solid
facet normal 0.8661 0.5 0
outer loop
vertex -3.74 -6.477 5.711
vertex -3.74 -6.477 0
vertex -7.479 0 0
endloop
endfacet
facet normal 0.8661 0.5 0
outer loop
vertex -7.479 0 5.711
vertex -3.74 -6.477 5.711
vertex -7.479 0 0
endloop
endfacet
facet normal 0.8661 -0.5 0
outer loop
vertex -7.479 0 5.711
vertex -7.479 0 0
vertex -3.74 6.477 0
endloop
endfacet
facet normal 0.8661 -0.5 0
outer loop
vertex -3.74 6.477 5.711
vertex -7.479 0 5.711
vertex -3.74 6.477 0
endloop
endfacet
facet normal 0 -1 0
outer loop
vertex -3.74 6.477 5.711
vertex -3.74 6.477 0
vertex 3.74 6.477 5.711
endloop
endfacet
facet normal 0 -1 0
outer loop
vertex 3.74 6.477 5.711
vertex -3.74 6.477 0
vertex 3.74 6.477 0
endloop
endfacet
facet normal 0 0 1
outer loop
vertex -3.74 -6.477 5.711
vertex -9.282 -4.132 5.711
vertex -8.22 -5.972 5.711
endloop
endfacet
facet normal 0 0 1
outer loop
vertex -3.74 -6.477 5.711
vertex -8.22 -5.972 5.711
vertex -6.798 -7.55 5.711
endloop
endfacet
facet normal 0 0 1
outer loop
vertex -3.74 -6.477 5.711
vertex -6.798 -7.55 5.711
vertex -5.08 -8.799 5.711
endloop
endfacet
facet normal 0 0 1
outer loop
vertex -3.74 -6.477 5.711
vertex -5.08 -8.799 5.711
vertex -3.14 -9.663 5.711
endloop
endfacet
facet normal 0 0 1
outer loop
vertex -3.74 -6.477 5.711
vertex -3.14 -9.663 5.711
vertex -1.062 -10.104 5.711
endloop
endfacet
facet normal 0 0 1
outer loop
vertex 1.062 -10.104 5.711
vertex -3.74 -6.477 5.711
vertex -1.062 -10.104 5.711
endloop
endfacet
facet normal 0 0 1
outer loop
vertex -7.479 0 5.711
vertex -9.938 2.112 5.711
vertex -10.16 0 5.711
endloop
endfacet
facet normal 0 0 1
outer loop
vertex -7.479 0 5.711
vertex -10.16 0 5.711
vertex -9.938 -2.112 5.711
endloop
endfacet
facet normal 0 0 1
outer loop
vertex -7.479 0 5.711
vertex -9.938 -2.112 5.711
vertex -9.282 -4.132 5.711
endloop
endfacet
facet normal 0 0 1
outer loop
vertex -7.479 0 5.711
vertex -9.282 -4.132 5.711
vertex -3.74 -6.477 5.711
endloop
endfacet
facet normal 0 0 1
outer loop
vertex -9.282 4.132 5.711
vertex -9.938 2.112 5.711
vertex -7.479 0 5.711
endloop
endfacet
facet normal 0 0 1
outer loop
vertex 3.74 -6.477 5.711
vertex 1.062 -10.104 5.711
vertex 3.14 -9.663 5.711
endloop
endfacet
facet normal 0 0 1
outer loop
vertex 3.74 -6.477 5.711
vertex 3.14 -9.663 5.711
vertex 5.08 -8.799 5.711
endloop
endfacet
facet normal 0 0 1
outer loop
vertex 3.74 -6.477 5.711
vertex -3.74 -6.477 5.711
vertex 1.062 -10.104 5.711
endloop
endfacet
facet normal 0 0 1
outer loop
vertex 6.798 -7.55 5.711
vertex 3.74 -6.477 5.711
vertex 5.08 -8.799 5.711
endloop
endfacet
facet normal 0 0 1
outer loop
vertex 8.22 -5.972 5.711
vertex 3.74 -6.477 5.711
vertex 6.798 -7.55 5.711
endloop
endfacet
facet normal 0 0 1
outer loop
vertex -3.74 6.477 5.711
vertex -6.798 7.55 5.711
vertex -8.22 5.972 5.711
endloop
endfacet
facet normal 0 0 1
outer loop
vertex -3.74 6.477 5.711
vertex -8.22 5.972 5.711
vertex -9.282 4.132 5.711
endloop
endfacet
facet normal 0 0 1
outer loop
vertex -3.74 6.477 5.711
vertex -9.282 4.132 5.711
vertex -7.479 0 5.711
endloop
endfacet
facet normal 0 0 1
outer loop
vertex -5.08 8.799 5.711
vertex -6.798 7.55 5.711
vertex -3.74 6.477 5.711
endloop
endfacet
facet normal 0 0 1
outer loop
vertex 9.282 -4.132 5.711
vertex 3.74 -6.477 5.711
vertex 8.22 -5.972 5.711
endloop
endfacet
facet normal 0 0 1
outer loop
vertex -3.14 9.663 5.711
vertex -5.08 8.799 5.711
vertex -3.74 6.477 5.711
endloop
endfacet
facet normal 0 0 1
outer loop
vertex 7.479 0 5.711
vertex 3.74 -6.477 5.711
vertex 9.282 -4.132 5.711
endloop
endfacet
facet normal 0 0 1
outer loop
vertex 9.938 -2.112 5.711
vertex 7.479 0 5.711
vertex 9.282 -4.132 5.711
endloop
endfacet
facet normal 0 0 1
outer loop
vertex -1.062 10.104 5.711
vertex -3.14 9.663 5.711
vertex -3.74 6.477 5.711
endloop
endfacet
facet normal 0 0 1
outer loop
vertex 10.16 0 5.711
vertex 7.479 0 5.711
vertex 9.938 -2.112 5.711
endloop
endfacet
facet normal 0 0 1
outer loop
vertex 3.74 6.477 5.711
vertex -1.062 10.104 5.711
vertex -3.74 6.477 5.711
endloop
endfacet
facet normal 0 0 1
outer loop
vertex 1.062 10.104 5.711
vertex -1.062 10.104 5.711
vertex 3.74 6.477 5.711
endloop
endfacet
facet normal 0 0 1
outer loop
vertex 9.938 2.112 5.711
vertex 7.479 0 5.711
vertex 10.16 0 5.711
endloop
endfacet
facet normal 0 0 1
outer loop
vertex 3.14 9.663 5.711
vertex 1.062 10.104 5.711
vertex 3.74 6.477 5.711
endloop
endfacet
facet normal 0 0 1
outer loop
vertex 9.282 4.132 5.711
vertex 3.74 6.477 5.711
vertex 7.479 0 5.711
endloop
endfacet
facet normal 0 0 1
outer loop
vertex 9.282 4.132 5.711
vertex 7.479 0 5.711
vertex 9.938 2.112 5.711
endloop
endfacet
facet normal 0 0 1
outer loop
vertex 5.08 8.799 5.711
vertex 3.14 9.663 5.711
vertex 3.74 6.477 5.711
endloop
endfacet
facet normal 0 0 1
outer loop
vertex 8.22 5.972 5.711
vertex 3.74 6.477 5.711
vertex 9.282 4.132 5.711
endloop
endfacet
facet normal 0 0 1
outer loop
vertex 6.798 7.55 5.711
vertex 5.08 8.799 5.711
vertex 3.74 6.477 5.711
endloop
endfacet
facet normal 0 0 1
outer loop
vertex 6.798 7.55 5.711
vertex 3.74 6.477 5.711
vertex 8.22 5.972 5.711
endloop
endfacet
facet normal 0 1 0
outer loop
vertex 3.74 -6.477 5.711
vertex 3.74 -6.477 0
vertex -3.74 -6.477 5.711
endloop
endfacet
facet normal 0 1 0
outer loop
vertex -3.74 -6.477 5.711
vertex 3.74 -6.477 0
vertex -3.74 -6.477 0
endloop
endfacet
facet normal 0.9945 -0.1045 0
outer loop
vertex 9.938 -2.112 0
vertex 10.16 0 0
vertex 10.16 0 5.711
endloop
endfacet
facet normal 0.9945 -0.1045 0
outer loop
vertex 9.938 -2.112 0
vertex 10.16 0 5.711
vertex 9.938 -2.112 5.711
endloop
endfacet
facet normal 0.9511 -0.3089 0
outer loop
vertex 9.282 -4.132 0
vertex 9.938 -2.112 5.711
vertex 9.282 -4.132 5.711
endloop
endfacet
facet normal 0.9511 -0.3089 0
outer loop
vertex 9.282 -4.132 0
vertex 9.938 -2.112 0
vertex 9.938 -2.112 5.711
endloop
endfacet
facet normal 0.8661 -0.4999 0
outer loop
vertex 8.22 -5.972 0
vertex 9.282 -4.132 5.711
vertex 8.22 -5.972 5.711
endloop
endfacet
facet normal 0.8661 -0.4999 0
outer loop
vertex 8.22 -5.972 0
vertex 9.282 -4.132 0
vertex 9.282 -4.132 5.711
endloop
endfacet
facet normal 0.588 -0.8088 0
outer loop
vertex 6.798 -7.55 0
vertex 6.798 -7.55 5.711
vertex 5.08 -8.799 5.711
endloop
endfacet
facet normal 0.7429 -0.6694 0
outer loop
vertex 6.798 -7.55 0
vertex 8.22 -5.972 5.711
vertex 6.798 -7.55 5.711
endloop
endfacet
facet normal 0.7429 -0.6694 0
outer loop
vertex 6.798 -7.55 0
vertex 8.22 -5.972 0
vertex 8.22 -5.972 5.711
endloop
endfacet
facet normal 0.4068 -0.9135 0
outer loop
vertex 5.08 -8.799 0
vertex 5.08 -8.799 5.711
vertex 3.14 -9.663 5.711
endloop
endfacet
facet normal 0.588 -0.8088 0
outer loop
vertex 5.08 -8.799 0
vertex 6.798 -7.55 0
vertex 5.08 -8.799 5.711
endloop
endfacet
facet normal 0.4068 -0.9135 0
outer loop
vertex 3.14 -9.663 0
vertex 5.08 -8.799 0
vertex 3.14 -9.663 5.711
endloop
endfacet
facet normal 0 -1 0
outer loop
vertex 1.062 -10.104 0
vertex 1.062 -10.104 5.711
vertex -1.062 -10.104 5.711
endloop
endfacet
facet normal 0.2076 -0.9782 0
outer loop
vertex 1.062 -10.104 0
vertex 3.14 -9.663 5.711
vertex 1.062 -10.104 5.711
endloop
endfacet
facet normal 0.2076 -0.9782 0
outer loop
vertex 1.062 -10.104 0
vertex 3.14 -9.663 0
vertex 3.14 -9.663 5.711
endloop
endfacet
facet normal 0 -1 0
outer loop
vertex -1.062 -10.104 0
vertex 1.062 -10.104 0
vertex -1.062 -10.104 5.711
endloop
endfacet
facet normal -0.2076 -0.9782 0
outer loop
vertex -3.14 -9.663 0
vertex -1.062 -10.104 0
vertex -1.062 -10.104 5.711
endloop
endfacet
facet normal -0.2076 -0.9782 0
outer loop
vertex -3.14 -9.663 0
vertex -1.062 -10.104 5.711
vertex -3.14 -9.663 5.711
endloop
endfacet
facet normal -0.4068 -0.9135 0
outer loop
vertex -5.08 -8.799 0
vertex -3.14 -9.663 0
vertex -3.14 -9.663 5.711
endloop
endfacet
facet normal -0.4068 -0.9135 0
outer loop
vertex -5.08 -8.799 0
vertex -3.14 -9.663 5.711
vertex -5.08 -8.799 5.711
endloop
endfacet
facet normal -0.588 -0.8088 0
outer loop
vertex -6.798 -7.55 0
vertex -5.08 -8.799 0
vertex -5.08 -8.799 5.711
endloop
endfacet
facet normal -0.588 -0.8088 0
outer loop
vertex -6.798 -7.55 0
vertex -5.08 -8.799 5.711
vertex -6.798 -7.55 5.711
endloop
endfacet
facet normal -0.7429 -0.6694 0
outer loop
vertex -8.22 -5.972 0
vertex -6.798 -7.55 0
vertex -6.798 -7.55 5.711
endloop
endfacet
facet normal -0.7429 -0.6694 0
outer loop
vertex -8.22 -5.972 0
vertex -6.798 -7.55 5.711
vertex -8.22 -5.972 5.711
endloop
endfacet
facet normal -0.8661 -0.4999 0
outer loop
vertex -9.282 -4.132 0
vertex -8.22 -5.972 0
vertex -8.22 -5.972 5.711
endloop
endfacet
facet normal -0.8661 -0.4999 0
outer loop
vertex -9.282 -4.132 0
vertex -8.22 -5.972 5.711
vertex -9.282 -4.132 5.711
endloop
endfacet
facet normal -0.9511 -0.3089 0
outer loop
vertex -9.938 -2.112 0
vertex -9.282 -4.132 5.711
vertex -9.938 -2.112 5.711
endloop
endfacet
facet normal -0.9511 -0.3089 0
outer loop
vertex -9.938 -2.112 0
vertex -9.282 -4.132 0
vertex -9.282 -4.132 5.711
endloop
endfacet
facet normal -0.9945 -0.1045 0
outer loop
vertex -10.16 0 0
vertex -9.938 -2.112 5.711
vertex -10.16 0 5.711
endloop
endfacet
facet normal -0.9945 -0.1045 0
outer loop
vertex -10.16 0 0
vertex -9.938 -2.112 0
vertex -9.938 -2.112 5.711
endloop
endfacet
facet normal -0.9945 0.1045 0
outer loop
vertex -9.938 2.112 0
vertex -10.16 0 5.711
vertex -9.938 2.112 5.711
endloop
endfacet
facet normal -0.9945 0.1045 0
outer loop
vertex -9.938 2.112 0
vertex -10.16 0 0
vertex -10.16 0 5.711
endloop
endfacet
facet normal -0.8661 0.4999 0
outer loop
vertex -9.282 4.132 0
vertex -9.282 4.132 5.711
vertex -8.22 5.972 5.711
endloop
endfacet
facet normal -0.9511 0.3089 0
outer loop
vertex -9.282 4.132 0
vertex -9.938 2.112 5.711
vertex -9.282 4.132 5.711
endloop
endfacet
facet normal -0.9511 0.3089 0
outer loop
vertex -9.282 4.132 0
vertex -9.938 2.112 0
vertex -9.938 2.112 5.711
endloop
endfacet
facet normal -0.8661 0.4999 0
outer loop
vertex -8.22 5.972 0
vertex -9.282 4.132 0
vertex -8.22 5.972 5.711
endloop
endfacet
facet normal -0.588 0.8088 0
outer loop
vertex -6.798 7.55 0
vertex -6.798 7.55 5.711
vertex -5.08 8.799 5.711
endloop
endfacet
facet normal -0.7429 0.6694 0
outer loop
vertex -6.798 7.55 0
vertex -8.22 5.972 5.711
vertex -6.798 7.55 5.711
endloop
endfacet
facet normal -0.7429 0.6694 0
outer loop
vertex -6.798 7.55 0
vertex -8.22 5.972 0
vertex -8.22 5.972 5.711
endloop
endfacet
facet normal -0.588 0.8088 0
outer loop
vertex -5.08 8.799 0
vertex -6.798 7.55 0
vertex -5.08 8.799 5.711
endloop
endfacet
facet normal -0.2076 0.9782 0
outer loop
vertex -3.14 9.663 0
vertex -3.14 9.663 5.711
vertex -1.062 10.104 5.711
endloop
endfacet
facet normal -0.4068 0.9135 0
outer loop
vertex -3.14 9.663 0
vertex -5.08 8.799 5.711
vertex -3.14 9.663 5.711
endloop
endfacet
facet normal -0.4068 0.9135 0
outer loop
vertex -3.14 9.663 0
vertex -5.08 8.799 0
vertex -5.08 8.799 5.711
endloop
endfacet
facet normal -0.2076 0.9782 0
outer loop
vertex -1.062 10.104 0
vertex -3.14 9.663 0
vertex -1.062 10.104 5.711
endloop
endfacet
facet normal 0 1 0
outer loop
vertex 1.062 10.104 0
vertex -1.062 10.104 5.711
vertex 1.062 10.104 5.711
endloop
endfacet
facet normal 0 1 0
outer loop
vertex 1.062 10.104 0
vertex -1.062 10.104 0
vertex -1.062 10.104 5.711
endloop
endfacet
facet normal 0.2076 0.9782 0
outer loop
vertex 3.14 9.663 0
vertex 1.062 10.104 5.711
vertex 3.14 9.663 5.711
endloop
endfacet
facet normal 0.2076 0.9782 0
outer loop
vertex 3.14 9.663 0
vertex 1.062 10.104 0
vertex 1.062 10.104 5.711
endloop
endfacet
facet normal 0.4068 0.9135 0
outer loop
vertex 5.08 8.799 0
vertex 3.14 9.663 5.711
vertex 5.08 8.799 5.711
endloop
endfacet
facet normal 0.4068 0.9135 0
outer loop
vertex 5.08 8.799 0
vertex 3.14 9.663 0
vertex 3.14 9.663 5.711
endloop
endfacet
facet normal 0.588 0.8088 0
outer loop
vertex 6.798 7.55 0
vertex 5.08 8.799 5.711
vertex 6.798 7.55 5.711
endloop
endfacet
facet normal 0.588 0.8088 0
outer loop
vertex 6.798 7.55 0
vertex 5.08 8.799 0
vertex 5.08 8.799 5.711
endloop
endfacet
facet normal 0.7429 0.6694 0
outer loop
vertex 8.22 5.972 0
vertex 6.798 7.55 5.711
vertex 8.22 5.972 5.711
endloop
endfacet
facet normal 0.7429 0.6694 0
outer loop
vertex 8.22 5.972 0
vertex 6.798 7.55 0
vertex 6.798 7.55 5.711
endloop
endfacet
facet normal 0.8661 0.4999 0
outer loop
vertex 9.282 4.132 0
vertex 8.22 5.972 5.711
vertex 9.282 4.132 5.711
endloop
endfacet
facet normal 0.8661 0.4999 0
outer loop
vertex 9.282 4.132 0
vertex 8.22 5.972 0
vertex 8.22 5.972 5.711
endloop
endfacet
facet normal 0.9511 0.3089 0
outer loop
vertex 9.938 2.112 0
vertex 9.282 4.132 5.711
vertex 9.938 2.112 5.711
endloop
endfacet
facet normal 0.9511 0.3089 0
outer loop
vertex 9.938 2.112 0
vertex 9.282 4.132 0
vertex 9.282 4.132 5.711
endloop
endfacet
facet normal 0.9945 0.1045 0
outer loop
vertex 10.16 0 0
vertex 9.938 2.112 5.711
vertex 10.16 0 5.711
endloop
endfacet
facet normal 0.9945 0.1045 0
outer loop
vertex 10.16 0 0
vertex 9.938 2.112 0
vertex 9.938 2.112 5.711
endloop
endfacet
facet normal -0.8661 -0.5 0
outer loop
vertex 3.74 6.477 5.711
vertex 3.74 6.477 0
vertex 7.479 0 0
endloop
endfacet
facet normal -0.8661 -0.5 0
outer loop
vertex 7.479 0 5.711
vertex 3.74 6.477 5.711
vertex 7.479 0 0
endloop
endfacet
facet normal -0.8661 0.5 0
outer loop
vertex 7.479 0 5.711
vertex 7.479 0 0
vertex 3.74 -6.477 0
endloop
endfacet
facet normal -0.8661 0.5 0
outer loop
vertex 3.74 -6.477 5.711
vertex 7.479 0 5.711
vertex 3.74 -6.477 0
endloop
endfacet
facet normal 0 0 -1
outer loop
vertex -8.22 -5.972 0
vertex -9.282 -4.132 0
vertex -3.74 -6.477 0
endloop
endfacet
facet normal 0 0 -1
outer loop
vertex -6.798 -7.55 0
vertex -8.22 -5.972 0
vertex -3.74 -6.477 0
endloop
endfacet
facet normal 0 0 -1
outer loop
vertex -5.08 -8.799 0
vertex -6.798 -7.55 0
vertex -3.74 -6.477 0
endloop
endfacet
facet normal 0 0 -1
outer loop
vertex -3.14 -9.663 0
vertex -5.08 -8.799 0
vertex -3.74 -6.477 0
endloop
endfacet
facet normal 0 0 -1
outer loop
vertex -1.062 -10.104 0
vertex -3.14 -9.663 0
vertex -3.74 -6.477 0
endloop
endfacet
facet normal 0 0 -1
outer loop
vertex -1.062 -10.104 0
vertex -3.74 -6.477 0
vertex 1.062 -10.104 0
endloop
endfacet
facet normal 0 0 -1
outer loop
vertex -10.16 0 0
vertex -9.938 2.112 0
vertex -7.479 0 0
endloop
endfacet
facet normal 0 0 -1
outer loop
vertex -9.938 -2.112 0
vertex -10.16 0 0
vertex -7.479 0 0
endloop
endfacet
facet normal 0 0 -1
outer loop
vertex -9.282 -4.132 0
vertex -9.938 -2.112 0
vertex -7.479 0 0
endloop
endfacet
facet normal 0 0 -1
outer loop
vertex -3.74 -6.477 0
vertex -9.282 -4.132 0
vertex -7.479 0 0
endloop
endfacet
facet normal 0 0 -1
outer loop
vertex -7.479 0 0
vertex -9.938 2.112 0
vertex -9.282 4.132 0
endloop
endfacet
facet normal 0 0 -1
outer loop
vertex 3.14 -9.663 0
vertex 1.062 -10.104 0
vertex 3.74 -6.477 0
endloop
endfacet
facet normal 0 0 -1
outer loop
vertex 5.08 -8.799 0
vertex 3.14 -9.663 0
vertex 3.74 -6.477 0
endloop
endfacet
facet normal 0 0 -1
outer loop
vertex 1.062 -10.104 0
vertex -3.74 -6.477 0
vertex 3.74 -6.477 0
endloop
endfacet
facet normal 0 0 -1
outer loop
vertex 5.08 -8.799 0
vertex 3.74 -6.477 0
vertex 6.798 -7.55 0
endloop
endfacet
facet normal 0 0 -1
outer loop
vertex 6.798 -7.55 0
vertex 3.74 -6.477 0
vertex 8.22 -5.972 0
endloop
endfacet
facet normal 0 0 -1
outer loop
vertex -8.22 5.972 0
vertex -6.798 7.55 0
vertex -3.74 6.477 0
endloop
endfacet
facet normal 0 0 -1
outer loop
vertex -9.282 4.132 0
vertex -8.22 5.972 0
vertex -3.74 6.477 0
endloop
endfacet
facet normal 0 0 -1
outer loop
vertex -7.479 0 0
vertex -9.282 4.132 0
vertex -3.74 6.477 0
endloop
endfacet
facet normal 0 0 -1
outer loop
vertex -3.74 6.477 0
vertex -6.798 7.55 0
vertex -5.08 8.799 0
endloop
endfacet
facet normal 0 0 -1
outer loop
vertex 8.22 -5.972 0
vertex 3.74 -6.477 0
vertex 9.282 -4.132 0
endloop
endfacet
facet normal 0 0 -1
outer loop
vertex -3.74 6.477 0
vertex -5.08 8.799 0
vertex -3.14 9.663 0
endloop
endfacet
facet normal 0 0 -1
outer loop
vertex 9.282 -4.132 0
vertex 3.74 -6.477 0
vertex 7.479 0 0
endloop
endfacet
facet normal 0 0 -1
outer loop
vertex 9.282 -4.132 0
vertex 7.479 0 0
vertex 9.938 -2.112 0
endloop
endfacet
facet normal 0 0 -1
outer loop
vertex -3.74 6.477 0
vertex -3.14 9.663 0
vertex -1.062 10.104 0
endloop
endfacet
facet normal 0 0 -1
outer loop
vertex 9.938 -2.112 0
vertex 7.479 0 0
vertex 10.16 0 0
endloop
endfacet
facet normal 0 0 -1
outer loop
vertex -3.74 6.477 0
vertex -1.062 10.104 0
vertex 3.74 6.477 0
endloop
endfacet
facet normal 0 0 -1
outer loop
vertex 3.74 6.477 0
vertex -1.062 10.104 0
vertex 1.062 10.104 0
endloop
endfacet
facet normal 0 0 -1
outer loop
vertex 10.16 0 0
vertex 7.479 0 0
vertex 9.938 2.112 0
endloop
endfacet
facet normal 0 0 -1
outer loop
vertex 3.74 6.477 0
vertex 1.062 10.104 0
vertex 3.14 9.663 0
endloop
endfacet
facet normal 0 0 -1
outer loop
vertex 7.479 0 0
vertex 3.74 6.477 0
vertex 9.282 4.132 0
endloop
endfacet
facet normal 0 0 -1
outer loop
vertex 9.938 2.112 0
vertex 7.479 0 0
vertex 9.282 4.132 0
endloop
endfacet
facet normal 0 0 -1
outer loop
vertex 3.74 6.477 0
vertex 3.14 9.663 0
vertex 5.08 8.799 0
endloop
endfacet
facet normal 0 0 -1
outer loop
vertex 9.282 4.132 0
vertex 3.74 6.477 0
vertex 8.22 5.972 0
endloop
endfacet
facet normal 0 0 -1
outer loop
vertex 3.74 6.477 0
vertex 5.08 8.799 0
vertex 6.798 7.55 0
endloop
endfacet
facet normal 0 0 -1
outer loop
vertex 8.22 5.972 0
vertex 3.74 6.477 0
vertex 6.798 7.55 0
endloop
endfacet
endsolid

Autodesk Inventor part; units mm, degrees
ref_plane "YZ Plane" through (0, 0, 0) normal (1, 0, 0) x (0, 1, 0)
ref_plane "XZ Plane" through (0, 0, 0) normal (0, 1, 0) x (-1, 0, 0)
ref_plane "XY Plane" through (0, 0, 0) normal (0, 0, 1) x (1, 0, 0)
sketch "Sketch1" plane through (0, 0, 0) normal (0, 0, 1) x (1, 0, 0)
  circle A0 centre (0, 0) radius 10.16
  line L0 (3.7395, -6.477) -> (-3.7395, -6.477)
  line L1 (-3.7395, -6.477) -> (-7.479, 0)
  line L2 (-7.479, 0) -> (-3.7395, 6.477)
  line L3 (-3.7395, 6.477) -> (3.7395, 6.477)
  line L4 (3.7395, 6.477) -> (7.479, 0)
  line L5 (7.479, 0) -> (3.7395, -6.477)
  dimension "d0" = 20.32
  dimension "d1" = 12.954
extrude "Extrusion1" add sketch "Sketch1" along normal blind 5.7112
properties part number "3DPRINT,KICKER,MOTOR,SPACER" material "ABS Plastic"
